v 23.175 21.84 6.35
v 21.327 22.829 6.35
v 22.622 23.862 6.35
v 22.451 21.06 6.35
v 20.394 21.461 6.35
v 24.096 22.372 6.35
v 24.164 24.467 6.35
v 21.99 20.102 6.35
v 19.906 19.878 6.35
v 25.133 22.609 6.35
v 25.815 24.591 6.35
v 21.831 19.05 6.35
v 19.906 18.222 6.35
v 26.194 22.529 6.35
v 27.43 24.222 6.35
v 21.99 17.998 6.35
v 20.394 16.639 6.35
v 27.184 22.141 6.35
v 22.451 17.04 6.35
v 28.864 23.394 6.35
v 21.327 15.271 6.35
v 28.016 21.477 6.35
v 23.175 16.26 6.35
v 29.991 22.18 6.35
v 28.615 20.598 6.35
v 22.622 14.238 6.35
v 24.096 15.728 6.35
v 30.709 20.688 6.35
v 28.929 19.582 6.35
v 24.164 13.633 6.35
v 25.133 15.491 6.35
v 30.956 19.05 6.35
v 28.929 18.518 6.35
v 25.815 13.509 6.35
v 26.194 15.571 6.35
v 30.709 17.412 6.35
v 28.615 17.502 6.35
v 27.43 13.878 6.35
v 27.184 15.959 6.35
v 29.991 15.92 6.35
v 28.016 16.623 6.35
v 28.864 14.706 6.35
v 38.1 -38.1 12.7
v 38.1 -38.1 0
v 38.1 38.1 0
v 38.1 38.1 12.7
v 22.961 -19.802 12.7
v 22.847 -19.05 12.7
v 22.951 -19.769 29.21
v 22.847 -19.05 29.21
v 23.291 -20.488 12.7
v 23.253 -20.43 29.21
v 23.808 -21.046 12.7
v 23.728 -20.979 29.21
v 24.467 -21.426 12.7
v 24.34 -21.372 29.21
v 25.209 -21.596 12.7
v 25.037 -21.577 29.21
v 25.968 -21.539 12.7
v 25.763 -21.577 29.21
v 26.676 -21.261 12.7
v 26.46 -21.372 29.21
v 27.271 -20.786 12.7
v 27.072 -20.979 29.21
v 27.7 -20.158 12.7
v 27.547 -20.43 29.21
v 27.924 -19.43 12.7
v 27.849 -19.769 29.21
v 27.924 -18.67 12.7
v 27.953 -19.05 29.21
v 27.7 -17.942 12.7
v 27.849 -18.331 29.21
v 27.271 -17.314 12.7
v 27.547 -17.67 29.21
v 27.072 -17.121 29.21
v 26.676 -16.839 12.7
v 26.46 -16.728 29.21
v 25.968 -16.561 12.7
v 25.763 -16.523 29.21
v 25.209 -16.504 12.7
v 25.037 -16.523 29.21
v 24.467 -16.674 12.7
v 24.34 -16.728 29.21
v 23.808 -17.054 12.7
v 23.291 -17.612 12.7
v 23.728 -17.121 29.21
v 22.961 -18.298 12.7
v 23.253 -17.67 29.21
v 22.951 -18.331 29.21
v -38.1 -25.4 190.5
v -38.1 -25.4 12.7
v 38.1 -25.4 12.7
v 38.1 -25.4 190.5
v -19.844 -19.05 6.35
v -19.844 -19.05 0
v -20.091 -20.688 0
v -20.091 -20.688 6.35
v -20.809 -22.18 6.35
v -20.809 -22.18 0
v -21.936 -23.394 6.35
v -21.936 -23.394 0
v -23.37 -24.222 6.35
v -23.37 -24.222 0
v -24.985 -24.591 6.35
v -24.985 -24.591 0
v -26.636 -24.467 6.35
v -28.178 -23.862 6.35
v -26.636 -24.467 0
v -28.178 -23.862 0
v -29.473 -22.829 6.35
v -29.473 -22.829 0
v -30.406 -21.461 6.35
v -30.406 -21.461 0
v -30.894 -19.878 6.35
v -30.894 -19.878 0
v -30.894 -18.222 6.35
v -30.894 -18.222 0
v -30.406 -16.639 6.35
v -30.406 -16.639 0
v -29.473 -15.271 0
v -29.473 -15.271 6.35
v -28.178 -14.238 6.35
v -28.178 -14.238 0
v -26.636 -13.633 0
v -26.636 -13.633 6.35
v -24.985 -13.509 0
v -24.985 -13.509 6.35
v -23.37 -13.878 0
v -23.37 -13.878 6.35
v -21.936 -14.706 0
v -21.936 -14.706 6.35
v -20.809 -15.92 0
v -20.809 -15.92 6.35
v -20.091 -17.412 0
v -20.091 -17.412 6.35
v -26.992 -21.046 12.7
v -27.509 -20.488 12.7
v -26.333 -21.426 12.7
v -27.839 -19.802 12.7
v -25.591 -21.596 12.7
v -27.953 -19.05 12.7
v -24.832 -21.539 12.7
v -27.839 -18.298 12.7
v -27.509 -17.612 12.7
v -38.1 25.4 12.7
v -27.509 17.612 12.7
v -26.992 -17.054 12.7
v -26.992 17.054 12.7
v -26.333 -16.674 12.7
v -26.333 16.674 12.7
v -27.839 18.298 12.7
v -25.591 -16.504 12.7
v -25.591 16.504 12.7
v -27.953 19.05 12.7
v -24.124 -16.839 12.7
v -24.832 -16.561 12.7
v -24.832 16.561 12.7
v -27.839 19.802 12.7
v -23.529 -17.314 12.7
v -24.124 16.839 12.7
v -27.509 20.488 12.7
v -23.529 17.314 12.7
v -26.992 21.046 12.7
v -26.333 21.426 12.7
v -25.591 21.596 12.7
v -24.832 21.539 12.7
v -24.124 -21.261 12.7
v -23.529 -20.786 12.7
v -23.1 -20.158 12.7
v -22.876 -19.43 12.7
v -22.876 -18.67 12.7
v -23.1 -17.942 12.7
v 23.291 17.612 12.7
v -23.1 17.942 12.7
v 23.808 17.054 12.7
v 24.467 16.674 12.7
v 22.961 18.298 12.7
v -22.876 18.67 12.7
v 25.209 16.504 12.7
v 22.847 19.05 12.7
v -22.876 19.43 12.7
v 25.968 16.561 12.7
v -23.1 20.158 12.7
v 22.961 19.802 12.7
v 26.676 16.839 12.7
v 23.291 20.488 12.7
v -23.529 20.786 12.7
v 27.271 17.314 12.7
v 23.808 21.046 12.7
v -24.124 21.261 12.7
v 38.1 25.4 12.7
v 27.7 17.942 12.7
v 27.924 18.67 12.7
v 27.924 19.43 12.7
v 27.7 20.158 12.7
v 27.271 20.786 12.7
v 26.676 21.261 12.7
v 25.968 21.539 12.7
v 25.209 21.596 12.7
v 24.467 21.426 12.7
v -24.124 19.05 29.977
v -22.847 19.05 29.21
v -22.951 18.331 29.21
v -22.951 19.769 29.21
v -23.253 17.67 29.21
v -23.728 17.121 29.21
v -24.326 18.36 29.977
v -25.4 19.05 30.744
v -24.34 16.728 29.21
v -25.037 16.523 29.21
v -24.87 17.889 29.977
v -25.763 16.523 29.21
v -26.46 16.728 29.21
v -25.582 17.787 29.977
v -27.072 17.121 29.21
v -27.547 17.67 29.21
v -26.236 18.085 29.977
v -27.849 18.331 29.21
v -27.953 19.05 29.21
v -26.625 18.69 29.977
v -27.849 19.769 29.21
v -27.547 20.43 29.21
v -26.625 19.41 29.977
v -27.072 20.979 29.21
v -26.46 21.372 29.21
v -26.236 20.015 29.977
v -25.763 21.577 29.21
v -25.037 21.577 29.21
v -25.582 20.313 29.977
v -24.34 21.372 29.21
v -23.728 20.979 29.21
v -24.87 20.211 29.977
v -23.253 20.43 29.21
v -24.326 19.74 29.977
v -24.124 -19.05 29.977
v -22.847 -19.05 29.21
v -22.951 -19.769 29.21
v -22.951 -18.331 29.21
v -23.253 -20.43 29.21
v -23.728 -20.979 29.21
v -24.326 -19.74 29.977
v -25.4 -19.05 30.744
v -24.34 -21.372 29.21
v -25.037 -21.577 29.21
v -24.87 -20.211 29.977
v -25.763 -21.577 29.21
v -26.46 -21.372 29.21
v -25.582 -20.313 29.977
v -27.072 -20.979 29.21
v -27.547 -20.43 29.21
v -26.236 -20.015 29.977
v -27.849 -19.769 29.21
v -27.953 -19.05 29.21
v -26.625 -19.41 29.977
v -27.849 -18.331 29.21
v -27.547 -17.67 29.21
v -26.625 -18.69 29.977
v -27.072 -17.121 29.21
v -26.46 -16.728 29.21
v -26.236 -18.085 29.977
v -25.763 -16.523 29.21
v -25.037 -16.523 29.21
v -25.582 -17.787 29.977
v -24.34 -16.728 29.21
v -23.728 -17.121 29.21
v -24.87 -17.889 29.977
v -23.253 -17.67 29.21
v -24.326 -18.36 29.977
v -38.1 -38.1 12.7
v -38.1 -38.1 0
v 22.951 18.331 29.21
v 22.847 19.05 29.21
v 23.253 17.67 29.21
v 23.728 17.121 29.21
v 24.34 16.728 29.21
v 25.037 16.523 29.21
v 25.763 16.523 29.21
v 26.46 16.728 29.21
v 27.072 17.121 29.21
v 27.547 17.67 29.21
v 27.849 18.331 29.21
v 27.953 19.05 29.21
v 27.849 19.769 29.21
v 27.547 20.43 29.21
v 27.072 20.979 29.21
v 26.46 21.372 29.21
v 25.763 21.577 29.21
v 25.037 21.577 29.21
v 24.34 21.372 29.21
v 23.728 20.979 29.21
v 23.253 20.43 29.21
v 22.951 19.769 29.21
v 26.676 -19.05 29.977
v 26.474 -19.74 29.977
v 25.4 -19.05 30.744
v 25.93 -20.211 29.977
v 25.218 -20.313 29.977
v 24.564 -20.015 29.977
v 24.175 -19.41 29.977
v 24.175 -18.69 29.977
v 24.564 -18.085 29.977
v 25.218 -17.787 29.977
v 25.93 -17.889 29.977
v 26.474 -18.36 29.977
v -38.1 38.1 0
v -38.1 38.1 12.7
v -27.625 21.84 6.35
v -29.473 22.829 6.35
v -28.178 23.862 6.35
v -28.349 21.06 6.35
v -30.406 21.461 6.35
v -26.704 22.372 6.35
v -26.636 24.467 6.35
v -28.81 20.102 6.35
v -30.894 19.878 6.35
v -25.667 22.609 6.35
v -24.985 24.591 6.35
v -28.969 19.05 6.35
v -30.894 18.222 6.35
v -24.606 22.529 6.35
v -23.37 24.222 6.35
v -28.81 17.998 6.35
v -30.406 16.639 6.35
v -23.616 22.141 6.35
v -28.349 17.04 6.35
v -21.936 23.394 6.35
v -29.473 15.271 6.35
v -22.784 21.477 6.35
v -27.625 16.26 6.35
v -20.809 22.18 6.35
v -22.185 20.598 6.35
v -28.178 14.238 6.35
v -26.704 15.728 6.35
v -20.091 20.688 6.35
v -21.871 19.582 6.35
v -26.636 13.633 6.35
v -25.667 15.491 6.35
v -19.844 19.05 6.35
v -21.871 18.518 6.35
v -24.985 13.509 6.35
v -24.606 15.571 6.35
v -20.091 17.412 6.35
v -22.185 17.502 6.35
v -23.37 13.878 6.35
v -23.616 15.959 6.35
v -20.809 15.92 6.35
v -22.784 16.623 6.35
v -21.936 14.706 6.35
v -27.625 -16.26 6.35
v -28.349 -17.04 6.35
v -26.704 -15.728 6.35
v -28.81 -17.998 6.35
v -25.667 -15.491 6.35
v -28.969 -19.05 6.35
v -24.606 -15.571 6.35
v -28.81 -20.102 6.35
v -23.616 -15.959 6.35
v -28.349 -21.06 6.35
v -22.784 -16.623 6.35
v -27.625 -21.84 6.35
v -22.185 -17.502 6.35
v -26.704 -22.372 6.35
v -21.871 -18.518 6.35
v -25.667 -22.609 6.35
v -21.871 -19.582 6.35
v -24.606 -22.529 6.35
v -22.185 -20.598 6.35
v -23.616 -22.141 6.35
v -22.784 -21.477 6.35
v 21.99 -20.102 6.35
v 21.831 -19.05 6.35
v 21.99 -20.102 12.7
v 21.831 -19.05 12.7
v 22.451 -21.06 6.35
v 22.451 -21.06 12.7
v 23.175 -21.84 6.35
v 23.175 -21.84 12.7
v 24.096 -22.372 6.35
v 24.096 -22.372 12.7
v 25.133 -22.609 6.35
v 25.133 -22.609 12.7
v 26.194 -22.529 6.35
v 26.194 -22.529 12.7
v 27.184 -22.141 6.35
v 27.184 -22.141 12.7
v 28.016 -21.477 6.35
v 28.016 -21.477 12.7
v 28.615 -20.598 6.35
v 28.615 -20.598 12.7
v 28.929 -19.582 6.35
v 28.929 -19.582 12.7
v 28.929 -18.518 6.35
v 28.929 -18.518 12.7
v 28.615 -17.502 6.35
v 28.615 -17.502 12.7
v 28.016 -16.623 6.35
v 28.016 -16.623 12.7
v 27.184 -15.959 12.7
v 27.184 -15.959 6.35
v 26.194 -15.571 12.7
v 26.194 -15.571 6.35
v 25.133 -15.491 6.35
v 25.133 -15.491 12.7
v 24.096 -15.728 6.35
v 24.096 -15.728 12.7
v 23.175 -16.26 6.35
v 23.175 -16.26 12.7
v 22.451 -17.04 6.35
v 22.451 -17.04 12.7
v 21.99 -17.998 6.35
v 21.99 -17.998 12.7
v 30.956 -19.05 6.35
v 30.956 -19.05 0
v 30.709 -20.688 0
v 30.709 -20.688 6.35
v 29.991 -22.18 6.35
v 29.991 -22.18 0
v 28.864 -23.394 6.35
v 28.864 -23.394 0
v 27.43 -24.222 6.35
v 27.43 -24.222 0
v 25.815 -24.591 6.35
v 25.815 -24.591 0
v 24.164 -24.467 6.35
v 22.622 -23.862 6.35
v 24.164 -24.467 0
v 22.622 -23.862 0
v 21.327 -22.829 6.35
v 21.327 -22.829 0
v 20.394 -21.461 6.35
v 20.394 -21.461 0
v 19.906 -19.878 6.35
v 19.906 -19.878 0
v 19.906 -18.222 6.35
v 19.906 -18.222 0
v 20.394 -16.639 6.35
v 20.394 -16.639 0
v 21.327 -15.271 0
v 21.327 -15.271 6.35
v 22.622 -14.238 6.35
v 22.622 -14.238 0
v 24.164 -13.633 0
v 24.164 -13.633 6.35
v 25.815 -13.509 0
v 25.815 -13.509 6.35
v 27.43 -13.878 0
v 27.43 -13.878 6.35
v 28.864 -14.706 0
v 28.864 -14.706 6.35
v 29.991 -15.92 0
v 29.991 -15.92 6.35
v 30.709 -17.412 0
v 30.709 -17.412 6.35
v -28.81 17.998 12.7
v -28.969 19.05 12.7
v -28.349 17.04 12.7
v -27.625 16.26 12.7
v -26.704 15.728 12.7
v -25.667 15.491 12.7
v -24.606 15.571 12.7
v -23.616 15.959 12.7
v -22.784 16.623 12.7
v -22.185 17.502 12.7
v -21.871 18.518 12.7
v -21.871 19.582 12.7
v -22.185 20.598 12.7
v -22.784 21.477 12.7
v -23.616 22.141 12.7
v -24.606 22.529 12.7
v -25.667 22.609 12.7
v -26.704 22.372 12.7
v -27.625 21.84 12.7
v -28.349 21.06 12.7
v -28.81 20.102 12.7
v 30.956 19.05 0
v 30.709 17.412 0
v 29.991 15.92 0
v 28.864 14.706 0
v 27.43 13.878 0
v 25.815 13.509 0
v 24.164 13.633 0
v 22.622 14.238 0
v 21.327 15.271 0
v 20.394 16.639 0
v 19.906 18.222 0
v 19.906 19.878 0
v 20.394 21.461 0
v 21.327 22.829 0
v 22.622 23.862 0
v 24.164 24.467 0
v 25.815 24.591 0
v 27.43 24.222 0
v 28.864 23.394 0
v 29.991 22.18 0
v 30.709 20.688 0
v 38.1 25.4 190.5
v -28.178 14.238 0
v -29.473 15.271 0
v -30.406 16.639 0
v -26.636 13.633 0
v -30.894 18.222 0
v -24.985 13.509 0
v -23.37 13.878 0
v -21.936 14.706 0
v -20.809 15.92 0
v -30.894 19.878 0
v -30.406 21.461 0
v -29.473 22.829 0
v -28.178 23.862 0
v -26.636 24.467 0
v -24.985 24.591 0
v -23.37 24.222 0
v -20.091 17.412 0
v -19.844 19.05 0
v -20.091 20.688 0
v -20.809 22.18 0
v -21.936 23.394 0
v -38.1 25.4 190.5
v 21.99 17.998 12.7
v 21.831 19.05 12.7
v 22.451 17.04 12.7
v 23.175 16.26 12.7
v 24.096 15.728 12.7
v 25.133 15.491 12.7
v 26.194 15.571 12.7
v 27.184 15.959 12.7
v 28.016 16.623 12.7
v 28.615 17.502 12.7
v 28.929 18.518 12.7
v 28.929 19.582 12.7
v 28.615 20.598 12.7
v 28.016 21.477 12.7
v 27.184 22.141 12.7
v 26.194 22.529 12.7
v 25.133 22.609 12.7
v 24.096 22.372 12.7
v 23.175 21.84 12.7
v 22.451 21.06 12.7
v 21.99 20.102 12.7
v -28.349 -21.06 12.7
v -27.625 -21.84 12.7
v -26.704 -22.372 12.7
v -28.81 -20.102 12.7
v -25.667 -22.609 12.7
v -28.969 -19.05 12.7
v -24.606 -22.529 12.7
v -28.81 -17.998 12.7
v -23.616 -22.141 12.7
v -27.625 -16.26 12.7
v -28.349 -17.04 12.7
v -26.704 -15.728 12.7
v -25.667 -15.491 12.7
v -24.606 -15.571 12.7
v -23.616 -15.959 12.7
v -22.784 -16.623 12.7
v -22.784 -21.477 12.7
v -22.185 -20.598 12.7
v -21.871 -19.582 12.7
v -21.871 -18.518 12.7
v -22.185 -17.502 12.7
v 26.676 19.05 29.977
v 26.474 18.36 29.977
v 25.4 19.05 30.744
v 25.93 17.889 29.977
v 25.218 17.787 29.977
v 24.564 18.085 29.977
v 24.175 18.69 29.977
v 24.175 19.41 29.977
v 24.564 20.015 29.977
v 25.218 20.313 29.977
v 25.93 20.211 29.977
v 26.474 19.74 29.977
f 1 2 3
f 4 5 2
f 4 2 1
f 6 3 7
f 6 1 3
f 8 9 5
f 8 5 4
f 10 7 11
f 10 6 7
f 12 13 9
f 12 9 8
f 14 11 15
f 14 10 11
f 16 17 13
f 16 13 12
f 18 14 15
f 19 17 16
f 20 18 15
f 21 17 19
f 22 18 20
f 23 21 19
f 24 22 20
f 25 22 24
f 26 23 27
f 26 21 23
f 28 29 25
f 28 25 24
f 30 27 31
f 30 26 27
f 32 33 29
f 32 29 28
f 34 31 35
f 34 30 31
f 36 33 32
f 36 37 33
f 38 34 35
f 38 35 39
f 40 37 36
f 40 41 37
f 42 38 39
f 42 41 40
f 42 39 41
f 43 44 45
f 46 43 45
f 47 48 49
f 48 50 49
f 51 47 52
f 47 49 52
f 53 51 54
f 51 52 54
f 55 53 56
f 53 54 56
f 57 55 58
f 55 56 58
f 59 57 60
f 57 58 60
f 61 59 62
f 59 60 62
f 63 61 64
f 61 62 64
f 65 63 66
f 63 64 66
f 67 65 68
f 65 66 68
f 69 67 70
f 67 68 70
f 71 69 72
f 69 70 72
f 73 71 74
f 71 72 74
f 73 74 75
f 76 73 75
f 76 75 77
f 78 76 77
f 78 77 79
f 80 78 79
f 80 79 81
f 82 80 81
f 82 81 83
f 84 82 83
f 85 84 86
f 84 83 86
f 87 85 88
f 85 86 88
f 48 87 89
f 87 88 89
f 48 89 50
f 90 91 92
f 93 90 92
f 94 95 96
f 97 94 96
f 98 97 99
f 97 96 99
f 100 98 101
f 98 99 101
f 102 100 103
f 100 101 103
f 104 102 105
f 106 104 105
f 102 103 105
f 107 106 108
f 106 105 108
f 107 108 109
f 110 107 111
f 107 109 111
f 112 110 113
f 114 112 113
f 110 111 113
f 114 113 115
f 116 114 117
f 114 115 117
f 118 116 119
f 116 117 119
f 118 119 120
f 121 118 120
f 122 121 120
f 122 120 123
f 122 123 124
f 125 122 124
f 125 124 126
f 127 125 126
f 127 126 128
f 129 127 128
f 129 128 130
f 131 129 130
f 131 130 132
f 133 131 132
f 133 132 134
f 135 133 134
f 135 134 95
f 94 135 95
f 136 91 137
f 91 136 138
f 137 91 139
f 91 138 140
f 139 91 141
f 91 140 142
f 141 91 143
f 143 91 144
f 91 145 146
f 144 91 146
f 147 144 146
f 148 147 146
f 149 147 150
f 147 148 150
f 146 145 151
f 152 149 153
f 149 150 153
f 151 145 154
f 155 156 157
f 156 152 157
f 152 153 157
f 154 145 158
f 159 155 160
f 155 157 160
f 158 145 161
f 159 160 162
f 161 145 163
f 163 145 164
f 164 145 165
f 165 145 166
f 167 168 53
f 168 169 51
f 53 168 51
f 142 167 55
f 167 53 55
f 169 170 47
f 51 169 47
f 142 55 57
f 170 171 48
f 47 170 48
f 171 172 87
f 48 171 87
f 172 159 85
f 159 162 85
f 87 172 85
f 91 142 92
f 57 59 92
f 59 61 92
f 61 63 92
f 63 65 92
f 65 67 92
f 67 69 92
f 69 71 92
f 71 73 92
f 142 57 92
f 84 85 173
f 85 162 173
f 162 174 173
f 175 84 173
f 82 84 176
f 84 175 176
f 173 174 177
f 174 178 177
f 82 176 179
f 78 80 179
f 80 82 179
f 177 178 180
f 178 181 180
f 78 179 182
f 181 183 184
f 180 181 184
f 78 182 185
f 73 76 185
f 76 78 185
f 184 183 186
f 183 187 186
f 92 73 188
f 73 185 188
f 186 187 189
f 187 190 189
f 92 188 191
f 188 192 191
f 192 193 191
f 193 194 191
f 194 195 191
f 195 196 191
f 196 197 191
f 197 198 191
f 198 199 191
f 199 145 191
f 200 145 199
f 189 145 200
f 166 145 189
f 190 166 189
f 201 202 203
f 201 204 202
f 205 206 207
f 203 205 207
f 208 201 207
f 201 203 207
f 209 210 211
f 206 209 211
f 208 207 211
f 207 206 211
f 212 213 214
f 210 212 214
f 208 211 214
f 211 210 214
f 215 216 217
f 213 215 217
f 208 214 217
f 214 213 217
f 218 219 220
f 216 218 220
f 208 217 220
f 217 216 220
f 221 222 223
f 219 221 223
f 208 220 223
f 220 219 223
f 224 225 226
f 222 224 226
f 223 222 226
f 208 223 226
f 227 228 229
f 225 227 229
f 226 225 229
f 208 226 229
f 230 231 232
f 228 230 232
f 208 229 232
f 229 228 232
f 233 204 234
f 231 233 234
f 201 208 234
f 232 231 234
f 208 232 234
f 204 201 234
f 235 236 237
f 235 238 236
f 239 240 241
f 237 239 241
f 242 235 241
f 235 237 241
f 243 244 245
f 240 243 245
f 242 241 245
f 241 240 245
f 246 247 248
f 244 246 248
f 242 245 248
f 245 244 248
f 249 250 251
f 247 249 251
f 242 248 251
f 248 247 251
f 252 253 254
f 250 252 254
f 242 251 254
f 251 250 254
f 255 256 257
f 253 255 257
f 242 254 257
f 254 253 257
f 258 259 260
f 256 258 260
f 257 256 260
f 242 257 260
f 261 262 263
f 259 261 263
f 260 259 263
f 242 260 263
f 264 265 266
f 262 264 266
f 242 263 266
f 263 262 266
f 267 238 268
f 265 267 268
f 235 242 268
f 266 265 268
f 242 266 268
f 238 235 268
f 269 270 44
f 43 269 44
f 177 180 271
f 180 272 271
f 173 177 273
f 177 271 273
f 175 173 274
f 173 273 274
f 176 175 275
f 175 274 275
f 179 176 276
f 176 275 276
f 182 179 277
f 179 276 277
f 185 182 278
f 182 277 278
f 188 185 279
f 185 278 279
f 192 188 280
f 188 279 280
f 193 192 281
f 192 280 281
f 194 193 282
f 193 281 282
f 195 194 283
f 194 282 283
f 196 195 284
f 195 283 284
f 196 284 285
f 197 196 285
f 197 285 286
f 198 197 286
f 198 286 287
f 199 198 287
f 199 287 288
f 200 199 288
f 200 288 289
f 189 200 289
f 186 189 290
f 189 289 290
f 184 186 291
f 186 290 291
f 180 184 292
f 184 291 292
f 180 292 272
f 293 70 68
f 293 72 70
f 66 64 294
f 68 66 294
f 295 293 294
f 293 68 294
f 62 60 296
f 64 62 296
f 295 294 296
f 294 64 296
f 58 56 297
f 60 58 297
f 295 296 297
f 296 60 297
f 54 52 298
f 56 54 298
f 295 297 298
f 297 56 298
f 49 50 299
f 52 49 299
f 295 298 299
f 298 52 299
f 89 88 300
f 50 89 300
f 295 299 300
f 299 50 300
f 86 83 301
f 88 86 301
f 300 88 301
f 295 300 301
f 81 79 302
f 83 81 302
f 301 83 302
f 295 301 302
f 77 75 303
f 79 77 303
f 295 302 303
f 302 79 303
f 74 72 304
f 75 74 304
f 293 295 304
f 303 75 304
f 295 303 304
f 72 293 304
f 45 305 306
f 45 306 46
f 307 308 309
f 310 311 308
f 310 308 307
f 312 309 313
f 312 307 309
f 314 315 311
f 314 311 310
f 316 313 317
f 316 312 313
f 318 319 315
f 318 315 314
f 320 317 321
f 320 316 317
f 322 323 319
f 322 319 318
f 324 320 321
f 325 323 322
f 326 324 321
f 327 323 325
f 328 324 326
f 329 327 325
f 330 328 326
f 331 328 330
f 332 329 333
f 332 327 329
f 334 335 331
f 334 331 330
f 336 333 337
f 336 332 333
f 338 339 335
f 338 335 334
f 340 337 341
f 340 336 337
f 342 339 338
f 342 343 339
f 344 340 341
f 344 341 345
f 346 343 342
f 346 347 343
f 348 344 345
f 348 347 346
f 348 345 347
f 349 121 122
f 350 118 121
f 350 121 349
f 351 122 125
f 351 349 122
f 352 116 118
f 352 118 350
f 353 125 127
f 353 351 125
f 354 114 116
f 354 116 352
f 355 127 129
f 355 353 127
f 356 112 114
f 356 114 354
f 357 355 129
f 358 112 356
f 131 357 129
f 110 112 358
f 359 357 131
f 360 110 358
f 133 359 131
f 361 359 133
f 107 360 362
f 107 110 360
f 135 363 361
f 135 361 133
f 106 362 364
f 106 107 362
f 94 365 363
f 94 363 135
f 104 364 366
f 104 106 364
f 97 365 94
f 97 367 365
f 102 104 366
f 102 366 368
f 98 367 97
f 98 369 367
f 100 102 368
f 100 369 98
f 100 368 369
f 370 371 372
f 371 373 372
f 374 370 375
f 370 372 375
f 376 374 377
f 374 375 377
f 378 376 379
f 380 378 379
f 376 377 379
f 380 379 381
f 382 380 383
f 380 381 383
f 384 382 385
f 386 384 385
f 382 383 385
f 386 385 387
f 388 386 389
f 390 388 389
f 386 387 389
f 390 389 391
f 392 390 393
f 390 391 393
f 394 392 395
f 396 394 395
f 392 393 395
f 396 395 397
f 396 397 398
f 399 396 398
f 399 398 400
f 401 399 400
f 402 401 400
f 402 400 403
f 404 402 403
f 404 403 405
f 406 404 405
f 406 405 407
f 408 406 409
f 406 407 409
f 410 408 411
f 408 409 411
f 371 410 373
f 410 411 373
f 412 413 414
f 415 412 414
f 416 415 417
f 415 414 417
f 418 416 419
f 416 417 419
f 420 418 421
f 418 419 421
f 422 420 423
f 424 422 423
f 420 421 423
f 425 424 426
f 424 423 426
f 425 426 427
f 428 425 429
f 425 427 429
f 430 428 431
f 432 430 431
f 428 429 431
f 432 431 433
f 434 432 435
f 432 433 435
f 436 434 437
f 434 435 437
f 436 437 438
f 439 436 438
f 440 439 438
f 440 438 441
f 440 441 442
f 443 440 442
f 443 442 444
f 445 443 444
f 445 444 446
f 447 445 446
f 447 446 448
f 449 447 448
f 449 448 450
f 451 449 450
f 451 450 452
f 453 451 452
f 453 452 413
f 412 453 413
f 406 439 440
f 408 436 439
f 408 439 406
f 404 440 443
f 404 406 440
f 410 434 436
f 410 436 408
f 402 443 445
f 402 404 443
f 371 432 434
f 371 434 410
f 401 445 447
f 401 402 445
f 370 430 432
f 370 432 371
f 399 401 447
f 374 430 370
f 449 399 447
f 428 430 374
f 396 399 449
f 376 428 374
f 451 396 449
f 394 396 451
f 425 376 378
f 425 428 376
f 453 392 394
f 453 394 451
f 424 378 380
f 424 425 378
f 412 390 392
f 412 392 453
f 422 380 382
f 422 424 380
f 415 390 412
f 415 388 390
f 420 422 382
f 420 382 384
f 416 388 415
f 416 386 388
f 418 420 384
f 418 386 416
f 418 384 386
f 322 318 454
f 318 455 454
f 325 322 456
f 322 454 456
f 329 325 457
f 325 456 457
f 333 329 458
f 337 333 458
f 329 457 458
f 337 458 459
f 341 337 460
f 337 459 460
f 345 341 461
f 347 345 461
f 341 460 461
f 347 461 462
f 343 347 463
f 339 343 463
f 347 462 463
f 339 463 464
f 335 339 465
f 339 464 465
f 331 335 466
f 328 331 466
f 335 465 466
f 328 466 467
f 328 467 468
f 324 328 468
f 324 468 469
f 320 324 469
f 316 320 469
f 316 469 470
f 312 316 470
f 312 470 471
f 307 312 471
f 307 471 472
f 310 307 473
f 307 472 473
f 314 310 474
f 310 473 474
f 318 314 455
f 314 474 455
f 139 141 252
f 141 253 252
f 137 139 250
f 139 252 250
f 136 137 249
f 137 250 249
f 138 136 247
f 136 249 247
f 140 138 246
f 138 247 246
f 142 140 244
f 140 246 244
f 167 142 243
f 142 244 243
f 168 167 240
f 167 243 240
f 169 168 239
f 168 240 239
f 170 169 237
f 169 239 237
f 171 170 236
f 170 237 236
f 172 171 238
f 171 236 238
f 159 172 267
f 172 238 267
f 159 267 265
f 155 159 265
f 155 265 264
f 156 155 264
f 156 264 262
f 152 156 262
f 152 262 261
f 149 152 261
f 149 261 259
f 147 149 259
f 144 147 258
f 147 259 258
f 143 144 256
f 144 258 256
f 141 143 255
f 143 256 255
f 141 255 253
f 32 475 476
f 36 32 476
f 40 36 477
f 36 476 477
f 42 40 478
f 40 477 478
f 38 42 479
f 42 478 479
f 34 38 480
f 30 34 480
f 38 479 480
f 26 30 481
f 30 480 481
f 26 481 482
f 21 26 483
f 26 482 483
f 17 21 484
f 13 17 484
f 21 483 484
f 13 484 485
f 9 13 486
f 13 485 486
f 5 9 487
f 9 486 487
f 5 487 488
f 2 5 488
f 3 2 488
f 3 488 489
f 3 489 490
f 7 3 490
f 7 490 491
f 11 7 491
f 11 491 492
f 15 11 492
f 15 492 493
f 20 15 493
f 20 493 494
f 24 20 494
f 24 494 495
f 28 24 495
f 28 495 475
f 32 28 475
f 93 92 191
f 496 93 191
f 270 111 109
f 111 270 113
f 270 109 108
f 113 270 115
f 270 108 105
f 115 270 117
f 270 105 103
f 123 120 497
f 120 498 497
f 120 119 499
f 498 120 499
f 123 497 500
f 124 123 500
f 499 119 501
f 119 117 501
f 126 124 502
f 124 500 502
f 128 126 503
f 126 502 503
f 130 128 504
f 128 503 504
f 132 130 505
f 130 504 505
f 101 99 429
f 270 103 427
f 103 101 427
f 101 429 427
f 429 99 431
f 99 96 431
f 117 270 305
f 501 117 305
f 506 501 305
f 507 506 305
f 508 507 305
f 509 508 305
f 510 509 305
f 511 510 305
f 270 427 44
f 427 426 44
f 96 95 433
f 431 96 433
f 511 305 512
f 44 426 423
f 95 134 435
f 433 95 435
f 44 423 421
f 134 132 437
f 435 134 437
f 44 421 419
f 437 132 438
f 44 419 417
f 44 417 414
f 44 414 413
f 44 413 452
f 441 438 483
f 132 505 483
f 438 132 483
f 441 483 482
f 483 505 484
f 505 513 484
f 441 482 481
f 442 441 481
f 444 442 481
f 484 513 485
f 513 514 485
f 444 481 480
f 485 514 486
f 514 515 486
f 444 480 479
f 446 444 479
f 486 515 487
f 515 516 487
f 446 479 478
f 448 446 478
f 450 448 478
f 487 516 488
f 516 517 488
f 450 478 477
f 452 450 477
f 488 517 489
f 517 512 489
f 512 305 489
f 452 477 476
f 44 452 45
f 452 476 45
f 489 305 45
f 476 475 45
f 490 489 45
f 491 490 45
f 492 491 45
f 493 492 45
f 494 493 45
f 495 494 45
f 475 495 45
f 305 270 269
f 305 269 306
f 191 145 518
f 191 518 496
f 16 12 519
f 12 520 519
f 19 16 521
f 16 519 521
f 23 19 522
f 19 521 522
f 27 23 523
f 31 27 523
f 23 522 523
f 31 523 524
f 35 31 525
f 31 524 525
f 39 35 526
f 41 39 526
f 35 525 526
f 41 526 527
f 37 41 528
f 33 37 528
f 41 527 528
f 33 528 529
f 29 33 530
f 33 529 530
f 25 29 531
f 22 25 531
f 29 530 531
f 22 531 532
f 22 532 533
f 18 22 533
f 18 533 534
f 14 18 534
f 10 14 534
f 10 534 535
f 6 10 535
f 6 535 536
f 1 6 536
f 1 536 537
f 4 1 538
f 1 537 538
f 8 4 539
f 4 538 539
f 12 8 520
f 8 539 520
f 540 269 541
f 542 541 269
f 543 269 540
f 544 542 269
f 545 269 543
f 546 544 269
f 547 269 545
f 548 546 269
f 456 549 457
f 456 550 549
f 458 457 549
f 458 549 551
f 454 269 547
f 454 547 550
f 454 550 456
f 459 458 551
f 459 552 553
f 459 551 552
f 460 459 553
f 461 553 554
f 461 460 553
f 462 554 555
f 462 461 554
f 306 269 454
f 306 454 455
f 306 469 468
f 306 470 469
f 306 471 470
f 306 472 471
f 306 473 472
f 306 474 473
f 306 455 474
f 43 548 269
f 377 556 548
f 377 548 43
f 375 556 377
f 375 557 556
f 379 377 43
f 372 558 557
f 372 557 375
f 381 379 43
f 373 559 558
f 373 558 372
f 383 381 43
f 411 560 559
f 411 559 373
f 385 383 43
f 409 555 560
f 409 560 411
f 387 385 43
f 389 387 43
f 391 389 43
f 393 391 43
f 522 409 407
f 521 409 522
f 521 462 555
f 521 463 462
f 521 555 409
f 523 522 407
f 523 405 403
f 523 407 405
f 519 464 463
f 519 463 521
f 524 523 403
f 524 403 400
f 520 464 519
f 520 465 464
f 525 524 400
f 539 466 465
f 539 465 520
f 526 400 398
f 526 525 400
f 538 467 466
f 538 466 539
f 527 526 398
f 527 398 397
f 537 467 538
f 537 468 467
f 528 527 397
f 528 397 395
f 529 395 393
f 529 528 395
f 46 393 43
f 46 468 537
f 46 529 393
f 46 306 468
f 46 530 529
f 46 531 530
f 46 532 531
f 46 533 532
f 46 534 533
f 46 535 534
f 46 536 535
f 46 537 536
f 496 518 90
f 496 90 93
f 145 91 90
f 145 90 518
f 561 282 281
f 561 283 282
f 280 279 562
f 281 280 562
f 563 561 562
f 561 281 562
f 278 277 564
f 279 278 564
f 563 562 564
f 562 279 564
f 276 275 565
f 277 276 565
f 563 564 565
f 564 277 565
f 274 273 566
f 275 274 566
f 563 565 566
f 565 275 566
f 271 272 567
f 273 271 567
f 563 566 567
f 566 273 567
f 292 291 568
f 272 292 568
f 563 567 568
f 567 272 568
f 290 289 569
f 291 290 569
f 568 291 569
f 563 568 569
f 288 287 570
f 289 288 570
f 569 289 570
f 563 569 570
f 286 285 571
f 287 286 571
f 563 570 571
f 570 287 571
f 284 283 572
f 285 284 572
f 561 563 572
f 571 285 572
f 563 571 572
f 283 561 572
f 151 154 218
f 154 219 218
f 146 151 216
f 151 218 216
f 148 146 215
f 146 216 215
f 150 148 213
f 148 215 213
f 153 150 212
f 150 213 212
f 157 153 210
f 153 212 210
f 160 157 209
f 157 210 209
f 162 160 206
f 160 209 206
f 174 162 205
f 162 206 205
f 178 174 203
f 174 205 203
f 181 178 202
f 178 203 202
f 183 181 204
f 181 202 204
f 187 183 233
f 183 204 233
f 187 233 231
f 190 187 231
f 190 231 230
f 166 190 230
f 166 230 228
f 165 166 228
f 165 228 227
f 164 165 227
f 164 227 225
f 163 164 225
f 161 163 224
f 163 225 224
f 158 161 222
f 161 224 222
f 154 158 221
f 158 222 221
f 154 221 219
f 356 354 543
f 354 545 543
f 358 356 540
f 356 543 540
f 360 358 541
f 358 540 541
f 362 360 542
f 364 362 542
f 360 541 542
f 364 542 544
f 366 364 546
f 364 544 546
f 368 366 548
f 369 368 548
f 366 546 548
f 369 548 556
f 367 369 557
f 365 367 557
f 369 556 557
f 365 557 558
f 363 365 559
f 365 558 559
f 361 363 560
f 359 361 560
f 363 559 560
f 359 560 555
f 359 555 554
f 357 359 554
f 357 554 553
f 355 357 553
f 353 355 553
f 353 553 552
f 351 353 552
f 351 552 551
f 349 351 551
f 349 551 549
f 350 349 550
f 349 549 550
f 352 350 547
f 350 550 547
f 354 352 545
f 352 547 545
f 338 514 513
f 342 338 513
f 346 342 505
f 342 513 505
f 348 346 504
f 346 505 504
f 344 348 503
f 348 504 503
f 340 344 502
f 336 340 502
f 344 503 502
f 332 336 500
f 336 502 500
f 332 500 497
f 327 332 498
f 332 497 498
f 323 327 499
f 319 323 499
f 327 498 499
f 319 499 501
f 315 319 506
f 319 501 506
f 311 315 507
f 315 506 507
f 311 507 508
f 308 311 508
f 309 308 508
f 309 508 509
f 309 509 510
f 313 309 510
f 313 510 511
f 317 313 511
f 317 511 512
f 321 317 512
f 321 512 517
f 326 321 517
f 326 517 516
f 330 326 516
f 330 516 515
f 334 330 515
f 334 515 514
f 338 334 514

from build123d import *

# Parameters (mm, degrees)
F0_W           = 76.2
F0_H           = 76.2
F1_DEPTH       = 12.7
F2_W           = 76.2
F2_H           = 50.8
F3_DEPTH       = 177.8
F5_D           = 7.1374
F5_CBORE_D     = 11.1125
F5_CBORE_DEPTH = 6.35
F6_D           = 5.1054
F6_DEPTH       = 16.51
F6_START       = 12.7
F6_TIP         = 1.5338169022


with BuildPart() as f1:
    # F0 (on Top) → F1 (new body)
    with BuildSketch(Plane.XY):
        Rectangle(F0_W, F0_H)
    extrude(amount=F1_DEPTH)

    # F5 (through all)
    with Locations(Plane(origin=(0, 0, 0), x_dir=(1, 0, 0), z_dir=(0, 0, -1))):
        with Locations((-25.4, -19.05), (-25.4, 19.05), (25.4, -19.05), (25.4, 19.05)):
            CounterBoreHole(F5_D / 2, F5_CBORE_D / 2, F5_CBORE_DEPTH)


with BuildPart() as f3:
    # F2 (on face) → F3 (new body)
    with BuildSketch(Plane.XY.offset(12.7)):
        Rectangle(F2_W, F2_H)
    extrude(amount=F3_DEPTH)

    # F6
    # its depths count from where the whole tool has entered the part; down to there all is cleared
    with Locations(Plane(origin=(0, 0, 0), x_dir=(1, 0, 0), z_dir=(0, 0, -1)).offset(-F6_START)):
        with Locations((25.4, -19.05), (25.4, 19.05), (-25.4, -19.05), (-25.4, 19.05)):
            Hole(F6_D / 2, depth=F6_DEPTH)
            with Locations((0, 0, -(F6_DEPTH + F6_TIP / 2))):  # 118° drill point
                Cone(0, F6_D / 2, F6_TIP, mode=Mode.SUBTRACT)


solid = Compound([f1.part, f3.part])
